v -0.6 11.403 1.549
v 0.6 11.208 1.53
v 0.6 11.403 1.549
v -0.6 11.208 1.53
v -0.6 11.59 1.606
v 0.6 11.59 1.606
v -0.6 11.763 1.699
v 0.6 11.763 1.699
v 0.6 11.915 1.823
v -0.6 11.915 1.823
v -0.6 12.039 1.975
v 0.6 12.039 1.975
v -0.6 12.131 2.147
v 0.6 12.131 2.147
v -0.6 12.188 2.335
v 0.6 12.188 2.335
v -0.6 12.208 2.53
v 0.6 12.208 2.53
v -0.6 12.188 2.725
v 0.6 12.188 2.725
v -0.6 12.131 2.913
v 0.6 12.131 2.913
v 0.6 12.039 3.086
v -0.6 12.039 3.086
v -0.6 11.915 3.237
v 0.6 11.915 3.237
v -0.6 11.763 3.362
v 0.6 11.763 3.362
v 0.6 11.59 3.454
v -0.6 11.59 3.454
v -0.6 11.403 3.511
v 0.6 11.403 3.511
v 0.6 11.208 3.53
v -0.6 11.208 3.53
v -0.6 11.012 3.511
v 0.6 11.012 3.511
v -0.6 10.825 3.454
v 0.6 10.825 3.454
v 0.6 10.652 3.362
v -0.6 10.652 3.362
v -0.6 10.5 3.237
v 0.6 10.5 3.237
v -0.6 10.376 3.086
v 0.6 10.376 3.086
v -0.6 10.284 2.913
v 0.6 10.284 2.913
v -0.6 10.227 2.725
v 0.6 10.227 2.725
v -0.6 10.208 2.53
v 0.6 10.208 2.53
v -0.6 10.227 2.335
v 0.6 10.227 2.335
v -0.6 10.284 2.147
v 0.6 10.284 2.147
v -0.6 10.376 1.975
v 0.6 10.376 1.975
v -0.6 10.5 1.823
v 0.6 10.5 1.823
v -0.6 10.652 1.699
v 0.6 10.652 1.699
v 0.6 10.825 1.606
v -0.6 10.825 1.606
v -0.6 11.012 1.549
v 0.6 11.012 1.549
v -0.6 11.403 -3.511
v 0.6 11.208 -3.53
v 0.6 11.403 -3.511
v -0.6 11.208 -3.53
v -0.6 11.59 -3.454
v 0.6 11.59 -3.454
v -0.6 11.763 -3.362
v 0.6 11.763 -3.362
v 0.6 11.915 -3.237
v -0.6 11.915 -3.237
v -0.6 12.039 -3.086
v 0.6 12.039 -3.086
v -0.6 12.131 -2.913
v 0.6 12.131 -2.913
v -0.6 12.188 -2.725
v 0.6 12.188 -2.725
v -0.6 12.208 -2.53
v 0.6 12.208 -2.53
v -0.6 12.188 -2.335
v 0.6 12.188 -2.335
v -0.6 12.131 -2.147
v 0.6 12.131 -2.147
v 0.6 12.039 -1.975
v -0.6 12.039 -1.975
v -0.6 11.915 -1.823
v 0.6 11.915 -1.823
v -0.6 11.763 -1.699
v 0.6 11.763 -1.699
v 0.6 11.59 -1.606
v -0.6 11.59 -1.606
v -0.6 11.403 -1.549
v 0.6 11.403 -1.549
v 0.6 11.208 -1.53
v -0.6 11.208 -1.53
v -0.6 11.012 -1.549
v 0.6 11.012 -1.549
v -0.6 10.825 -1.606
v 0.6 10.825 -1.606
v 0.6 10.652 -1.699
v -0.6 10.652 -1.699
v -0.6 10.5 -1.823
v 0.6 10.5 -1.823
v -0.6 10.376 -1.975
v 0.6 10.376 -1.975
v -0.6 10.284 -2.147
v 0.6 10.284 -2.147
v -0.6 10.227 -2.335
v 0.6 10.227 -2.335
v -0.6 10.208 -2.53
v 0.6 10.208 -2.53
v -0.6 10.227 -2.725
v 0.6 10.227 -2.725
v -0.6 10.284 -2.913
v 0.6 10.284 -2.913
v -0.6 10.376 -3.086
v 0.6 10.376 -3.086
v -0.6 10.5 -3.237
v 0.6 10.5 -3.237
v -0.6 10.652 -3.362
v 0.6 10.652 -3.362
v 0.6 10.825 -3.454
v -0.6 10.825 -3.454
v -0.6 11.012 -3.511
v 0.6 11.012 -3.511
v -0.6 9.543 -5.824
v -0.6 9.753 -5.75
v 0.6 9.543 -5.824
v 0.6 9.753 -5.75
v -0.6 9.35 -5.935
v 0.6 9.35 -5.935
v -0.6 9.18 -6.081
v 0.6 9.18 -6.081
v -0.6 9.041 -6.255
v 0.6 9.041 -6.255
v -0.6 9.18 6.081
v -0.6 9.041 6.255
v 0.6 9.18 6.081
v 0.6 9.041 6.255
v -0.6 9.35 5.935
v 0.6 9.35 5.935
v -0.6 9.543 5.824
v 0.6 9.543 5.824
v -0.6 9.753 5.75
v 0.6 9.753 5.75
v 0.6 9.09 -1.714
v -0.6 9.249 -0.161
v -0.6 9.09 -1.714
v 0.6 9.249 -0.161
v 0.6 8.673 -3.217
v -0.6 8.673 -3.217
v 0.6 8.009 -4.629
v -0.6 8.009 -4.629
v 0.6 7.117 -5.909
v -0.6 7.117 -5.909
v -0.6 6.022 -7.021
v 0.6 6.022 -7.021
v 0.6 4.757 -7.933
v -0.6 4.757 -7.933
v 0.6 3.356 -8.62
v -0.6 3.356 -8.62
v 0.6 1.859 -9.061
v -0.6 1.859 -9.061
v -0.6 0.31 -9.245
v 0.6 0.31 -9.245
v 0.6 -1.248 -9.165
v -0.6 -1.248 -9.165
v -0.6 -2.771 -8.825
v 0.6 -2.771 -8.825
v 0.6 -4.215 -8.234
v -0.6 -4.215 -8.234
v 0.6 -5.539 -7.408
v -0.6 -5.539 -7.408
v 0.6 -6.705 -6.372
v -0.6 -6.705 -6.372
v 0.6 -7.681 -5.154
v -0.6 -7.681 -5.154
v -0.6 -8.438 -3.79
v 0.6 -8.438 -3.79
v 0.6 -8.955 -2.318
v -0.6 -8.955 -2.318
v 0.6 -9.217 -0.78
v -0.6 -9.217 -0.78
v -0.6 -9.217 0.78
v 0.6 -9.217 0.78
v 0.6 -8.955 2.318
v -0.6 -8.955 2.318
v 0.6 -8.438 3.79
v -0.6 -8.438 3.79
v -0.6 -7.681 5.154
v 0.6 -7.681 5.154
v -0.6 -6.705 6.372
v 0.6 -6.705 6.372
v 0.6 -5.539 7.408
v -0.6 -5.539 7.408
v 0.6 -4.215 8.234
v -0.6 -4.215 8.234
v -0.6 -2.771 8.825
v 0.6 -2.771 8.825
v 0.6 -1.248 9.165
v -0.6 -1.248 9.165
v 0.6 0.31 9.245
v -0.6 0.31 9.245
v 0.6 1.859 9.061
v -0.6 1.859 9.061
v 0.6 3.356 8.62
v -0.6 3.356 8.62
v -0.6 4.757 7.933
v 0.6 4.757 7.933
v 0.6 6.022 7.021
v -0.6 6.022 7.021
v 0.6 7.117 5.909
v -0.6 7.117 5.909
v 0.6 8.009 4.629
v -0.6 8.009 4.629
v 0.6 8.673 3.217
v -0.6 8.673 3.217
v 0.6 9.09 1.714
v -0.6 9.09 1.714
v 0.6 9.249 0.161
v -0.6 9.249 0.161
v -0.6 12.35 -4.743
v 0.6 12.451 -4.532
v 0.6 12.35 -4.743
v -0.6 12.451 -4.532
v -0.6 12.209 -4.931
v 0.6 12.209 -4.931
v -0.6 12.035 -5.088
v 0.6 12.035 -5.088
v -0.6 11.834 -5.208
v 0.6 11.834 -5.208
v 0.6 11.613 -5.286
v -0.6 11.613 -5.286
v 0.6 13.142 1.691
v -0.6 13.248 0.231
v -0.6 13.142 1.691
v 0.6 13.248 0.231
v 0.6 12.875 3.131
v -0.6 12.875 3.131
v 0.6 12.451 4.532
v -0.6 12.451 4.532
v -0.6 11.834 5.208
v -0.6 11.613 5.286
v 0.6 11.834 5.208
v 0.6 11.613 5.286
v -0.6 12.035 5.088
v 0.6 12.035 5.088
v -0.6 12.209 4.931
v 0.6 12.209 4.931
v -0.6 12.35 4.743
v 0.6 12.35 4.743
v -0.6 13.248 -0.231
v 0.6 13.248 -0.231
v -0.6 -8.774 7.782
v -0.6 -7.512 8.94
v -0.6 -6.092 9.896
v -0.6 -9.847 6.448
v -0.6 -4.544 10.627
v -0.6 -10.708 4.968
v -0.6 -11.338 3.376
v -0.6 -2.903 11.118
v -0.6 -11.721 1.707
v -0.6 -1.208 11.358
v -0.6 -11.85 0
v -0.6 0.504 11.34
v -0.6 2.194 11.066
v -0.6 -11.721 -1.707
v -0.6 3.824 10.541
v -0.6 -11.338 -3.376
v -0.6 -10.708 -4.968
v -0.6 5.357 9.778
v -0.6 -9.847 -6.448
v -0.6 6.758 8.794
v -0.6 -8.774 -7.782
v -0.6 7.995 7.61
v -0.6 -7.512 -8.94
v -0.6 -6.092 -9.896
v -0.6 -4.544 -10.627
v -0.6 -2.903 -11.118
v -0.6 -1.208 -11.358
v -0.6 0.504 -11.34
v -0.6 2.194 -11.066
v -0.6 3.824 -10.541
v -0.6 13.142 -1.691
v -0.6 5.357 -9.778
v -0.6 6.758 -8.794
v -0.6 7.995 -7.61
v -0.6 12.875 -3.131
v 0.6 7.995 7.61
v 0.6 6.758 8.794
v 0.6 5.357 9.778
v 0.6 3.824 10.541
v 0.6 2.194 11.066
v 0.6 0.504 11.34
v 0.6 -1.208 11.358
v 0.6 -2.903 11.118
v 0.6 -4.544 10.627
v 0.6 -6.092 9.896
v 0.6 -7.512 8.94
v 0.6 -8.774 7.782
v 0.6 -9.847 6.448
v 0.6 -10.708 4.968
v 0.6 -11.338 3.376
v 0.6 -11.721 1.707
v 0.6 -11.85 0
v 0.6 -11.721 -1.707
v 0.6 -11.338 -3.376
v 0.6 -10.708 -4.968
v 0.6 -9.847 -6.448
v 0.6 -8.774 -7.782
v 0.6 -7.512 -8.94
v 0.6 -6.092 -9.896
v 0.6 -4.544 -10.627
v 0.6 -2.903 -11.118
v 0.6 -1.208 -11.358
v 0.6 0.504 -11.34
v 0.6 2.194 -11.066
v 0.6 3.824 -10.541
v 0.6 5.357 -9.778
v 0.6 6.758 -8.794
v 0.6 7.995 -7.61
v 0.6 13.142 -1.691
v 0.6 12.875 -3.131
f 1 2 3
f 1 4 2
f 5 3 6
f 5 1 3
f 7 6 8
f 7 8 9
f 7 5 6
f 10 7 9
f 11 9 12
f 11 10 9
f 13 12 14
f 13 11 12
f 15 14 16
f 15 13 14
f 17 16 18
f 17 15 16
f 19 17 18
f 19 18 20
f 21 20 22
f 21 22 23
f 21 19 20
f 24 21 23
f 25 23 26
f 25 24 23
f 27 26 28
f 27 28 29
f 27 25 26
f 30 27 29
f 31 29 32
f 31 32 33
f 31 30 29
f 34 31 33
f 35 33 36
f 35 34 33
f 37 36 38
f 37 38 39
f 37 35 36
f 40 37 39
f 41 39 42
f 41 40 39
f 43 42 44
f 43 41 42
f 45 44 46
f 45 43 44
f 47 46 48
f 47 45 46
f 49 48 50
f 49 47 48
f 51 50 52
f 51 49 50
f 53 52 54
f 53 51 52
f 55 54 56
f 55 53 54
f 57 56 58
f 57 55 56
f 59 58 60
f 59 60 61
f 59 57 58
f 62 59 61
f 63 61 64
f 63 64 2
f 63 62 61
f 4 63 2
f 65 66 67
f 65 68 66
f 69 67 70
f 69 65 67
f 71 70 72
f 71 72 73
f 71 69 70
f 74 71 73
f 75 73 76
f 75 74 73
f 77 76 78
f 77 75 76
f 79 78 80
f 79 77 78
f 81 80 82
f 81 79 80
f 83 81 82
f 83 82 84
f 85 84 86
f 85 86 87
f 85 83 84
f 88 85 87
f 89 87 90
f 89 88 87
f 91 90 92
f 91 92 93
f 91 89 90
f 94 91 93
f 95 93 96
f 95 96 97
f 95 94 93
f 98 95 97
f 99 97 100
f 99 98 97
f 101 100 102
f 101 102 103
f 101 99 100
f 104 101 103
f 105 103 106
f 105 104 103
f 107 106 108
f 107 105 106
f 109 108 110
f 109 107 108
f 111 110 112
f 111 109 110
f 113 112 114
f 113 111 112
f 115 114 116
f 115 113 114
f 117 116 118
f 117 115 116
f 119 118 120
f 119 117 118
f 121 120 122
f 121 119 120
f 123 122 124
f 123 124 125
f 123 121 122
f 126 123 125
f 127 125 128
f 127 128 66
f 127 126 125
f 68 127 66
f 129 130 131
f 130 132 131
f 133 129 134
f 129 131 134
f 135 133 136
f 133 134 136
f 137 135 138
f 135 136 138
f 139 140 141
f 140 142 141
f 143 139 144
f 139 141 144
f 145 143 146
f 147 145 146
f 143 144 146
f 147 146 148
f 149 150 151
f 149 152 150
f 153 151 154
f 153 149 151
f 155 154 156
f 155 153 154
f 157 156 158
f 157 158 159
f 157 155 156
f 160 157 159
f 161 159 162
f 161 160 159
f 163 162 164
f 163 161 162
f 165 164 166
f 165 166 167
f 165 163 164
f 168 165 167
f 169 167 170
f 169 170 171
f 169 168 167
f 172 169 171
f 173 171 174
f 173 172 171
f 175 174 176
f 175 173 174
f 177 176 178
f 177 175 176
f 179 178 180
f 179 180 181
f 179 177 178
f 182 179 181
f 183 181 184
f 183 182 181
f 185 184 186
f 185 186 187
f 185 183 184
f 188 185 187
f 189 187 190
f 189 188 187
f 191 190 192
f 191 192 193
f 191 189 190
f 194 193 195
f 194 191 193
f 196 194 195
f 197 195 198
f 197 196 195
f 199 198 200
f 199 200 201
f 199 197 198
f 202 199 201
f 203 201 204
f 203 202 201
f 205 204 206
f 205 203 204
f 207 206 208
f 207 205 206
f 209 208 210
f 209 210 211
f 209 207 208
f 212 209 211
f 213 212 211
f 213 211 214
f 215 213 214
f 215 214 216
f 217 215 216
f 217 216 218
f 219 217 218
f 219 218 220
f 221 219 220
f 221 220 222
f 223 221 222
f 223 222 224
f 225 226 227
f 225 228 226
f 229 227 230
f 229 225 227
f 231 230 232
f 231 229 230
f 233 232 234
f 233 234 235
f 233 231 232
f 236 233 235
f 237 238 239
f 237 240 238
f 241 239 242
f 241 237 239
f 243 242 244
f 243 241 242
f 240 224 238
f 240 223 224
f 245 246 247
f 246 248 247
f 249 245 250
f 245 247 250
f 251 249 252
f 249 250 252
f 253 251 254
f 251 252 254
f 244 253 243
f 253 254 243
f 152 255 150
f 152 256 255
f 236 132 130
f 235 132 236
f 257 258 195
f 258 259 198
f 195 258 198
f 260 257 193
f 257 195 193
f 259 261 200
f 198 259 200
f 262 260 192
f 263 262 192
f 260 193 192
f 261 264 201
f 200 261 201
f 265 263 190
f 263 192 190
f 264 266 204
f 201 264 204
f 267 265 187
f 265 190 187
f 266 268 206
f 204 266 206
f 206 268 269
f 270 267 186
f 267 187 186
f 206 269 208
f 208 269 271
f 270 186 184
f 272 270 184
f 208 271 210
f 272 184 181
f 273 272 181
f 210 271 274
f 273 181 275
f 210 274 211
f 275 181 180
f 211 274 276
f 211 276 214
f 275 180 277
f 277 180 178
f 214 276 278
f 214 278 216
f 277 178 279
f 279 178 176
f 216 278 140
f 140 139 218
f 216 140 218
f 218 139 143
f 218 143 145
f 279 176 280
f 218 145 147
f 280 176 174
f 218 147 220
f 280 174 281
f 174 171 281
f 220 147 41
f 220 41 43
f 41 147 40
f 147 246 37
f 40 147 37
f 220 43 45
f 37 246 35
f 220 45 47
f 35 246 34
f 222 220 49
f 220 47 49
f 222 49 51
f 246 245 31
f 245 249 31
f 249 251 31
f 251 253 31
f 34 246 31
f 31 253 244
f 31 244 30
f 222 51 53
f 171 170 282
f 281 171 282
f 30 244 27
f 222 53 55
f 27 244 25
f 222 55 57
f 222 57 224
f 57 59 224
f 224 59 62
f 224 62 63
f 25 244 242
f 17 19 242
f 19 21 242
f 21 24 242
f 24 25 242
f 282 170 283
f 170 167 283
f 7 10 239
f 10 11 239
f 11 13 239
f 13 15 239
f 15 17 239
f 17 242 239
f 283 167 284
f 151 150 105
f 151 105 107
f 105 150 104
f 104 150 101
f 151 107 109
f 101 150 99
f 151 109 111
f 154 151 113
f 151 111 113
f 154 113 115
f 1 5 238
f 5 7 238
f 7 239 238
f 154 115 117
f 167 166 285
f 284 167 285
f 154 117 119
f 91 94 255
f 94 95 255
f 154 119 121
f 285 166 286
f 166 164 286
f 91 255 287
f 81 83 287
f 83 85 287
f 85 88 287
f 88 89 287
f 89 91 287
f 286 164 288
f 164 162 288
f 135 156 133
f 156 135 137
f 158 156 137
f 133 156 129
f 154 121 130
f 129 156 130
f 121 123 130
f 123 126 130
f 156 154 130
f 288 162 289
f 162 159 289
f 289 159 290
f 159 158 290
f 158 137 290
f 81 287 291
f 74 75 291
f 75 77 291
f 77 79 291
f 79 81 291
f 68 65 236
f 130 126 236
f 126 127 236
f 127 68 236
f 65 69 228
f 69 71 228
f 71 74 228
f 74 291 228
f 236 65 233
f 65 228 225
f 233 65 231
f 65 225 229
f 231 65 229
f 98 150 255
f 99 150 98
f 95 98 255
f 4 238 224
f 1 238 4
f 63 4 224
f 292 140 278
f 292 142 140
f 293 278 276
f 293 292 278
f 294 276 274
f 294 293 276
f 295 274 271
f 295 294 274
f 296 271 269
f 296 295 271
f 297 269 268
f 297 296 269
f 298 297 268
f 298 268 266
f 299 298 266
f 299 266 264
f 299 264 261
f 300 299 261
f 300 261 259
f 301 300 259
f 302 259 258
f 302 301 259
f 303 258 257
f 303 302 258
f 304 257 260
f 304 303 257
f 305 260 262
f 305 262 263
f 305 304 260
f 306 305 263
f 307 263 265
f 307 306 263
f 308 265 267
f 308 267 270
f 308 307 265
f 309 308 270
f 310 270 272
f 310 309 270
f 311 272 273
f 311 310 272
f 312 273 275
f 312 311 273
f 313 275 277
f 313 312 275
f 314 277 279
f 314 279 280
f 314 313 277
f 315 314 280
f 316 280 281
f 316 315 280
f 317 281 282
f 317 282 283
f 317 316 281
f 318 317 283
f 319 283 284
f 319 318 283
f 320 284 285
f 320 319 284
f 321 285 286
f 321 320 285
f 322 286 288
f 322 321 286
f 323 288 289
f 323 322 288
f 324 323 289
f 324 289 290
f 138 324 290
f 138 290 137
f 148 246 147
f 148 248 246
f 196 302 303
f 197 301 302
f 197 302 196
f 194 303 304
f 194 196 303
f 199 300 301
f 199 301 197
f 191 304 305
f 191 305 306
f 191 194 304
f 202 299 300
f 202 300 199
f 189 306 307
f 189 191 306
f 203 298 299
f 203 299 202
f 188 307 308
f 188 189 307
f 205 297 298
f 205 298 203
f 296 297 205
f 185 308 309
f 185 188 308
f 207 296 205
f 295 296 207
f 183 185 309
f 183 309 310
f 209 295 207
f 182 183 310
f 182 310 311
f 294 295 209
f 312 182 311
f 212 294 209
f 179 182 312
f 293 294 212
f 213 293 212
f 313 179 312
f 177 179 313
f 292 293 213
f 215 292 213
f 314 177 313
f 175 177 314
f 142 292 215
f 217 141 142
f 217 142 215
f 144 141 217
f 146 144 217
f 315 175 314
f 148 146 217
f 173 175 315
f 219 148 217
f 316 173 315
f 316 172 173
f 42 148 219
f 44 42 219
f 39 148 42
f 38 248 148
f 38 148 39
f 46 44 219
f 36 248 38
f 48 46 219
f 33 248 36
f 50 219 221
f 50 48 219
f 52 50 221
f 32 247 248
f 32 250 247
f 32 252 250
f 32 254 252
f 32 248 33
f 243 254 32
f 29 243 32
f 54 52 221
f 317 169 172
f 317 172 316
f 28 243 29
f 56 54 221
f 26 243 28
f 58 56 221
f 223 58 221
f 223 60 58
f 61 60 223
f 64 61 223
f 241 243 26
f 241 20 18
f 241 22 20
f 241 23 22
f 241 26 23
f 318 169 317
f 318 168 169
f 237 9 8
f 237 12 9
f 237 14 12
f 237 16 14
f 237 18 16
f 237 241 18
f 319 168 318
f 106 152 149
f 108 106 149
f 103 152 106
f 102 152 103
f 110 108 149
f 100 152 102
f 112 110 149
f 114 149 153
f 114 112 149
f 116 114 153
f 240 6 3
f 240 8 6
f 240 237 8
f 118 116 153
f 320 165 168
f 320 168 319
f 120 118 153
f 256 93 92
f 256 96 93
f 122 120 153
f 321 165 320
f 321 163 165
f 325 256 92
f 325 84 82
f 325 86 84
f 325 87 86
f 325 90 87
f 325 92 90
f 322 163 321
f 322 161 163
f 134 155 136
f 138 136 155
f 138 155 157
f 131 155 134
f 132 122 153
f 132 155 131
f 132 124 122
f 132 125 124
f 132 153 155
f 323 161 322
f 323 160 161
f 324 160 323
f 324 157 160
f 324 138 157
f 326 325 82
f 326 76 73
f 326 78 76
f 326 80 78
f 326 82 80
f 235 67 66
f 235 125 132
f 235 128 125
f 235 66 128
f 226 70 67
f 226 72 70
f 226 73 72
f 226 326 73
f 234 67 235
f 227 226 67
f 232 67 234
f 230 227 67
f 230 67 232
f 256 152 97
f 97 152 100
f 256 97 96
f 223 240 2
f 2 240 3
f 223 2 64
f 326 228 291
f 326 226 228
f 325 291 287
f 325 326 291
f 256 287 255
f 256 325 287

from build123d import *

# Parameters (mm, degrees)
SKETCH1_R      = 1
EXTRUDE1_DEPTH = 0.6
FILLET1_R      = 1.2


with BuildPart() as part:
    # Sketch1 → Extrude1 (new body, symmetric)
    with BuildSketch(Plane(origin=(0, 0, 0), x_dir=(0, 0, -1), z_dir=(1, 0, 0))):
        with BuildLine():
            Line((-0.16143476, 9.24859118), (-0.231244385, 13.247981961))
            ThreePointArc((-0.231244385, 13.247981961), (-2.73314864, 12.965045257), (-5.136358645, 12.213939572))
            Line((-5.136358645, 12.213939572), (-5.866544122, 9.285325583))
            ThreePointArc((-5.866544122, 9.285325583), (0, -11.85), (5.866544122, 9.285325583))
            Line((5.866544122, 9.285325583), (5.136358645, 12.213939572))
            ThreePointArc((5.136358645, 12.213939572), (2.73314864, 12.965045257), (0.231244385, 13.247981961))
            Line((0.231244385, 13.247981961), (0.16143476, 9.24859118))
            ThreePointArc((0.16143476, 9.24859118), (0, -9.25), (-0.16143476, 9.24859118))
        make_face()
        with Locations((-2.53014565, 11.207549834)):
            Circle(SKETCH1_R, mode=Mode.SUBTRACT)
        with Locations((2.53014565, 11.207549834)):
            Circle(SKETCH1_R, mode=Mode.SUBTRACT)
    extrude(amount=EXTRUDE1_DEPTH, both=True)

    # Fillet1
    fillet1_edges = [part.edges().sort_by_distance(p)[0] for p in [
        (0, 12.213939572, -5.136358645),
        (0, 9.285325583, -5.866544122),
        (0, 9.285325583, 5.866544122),
        (0, 12.213939572, 5.136358645),
    ]]
    fillet(fillet1_edges, radius=FILLET1_R)


solid = part.part
